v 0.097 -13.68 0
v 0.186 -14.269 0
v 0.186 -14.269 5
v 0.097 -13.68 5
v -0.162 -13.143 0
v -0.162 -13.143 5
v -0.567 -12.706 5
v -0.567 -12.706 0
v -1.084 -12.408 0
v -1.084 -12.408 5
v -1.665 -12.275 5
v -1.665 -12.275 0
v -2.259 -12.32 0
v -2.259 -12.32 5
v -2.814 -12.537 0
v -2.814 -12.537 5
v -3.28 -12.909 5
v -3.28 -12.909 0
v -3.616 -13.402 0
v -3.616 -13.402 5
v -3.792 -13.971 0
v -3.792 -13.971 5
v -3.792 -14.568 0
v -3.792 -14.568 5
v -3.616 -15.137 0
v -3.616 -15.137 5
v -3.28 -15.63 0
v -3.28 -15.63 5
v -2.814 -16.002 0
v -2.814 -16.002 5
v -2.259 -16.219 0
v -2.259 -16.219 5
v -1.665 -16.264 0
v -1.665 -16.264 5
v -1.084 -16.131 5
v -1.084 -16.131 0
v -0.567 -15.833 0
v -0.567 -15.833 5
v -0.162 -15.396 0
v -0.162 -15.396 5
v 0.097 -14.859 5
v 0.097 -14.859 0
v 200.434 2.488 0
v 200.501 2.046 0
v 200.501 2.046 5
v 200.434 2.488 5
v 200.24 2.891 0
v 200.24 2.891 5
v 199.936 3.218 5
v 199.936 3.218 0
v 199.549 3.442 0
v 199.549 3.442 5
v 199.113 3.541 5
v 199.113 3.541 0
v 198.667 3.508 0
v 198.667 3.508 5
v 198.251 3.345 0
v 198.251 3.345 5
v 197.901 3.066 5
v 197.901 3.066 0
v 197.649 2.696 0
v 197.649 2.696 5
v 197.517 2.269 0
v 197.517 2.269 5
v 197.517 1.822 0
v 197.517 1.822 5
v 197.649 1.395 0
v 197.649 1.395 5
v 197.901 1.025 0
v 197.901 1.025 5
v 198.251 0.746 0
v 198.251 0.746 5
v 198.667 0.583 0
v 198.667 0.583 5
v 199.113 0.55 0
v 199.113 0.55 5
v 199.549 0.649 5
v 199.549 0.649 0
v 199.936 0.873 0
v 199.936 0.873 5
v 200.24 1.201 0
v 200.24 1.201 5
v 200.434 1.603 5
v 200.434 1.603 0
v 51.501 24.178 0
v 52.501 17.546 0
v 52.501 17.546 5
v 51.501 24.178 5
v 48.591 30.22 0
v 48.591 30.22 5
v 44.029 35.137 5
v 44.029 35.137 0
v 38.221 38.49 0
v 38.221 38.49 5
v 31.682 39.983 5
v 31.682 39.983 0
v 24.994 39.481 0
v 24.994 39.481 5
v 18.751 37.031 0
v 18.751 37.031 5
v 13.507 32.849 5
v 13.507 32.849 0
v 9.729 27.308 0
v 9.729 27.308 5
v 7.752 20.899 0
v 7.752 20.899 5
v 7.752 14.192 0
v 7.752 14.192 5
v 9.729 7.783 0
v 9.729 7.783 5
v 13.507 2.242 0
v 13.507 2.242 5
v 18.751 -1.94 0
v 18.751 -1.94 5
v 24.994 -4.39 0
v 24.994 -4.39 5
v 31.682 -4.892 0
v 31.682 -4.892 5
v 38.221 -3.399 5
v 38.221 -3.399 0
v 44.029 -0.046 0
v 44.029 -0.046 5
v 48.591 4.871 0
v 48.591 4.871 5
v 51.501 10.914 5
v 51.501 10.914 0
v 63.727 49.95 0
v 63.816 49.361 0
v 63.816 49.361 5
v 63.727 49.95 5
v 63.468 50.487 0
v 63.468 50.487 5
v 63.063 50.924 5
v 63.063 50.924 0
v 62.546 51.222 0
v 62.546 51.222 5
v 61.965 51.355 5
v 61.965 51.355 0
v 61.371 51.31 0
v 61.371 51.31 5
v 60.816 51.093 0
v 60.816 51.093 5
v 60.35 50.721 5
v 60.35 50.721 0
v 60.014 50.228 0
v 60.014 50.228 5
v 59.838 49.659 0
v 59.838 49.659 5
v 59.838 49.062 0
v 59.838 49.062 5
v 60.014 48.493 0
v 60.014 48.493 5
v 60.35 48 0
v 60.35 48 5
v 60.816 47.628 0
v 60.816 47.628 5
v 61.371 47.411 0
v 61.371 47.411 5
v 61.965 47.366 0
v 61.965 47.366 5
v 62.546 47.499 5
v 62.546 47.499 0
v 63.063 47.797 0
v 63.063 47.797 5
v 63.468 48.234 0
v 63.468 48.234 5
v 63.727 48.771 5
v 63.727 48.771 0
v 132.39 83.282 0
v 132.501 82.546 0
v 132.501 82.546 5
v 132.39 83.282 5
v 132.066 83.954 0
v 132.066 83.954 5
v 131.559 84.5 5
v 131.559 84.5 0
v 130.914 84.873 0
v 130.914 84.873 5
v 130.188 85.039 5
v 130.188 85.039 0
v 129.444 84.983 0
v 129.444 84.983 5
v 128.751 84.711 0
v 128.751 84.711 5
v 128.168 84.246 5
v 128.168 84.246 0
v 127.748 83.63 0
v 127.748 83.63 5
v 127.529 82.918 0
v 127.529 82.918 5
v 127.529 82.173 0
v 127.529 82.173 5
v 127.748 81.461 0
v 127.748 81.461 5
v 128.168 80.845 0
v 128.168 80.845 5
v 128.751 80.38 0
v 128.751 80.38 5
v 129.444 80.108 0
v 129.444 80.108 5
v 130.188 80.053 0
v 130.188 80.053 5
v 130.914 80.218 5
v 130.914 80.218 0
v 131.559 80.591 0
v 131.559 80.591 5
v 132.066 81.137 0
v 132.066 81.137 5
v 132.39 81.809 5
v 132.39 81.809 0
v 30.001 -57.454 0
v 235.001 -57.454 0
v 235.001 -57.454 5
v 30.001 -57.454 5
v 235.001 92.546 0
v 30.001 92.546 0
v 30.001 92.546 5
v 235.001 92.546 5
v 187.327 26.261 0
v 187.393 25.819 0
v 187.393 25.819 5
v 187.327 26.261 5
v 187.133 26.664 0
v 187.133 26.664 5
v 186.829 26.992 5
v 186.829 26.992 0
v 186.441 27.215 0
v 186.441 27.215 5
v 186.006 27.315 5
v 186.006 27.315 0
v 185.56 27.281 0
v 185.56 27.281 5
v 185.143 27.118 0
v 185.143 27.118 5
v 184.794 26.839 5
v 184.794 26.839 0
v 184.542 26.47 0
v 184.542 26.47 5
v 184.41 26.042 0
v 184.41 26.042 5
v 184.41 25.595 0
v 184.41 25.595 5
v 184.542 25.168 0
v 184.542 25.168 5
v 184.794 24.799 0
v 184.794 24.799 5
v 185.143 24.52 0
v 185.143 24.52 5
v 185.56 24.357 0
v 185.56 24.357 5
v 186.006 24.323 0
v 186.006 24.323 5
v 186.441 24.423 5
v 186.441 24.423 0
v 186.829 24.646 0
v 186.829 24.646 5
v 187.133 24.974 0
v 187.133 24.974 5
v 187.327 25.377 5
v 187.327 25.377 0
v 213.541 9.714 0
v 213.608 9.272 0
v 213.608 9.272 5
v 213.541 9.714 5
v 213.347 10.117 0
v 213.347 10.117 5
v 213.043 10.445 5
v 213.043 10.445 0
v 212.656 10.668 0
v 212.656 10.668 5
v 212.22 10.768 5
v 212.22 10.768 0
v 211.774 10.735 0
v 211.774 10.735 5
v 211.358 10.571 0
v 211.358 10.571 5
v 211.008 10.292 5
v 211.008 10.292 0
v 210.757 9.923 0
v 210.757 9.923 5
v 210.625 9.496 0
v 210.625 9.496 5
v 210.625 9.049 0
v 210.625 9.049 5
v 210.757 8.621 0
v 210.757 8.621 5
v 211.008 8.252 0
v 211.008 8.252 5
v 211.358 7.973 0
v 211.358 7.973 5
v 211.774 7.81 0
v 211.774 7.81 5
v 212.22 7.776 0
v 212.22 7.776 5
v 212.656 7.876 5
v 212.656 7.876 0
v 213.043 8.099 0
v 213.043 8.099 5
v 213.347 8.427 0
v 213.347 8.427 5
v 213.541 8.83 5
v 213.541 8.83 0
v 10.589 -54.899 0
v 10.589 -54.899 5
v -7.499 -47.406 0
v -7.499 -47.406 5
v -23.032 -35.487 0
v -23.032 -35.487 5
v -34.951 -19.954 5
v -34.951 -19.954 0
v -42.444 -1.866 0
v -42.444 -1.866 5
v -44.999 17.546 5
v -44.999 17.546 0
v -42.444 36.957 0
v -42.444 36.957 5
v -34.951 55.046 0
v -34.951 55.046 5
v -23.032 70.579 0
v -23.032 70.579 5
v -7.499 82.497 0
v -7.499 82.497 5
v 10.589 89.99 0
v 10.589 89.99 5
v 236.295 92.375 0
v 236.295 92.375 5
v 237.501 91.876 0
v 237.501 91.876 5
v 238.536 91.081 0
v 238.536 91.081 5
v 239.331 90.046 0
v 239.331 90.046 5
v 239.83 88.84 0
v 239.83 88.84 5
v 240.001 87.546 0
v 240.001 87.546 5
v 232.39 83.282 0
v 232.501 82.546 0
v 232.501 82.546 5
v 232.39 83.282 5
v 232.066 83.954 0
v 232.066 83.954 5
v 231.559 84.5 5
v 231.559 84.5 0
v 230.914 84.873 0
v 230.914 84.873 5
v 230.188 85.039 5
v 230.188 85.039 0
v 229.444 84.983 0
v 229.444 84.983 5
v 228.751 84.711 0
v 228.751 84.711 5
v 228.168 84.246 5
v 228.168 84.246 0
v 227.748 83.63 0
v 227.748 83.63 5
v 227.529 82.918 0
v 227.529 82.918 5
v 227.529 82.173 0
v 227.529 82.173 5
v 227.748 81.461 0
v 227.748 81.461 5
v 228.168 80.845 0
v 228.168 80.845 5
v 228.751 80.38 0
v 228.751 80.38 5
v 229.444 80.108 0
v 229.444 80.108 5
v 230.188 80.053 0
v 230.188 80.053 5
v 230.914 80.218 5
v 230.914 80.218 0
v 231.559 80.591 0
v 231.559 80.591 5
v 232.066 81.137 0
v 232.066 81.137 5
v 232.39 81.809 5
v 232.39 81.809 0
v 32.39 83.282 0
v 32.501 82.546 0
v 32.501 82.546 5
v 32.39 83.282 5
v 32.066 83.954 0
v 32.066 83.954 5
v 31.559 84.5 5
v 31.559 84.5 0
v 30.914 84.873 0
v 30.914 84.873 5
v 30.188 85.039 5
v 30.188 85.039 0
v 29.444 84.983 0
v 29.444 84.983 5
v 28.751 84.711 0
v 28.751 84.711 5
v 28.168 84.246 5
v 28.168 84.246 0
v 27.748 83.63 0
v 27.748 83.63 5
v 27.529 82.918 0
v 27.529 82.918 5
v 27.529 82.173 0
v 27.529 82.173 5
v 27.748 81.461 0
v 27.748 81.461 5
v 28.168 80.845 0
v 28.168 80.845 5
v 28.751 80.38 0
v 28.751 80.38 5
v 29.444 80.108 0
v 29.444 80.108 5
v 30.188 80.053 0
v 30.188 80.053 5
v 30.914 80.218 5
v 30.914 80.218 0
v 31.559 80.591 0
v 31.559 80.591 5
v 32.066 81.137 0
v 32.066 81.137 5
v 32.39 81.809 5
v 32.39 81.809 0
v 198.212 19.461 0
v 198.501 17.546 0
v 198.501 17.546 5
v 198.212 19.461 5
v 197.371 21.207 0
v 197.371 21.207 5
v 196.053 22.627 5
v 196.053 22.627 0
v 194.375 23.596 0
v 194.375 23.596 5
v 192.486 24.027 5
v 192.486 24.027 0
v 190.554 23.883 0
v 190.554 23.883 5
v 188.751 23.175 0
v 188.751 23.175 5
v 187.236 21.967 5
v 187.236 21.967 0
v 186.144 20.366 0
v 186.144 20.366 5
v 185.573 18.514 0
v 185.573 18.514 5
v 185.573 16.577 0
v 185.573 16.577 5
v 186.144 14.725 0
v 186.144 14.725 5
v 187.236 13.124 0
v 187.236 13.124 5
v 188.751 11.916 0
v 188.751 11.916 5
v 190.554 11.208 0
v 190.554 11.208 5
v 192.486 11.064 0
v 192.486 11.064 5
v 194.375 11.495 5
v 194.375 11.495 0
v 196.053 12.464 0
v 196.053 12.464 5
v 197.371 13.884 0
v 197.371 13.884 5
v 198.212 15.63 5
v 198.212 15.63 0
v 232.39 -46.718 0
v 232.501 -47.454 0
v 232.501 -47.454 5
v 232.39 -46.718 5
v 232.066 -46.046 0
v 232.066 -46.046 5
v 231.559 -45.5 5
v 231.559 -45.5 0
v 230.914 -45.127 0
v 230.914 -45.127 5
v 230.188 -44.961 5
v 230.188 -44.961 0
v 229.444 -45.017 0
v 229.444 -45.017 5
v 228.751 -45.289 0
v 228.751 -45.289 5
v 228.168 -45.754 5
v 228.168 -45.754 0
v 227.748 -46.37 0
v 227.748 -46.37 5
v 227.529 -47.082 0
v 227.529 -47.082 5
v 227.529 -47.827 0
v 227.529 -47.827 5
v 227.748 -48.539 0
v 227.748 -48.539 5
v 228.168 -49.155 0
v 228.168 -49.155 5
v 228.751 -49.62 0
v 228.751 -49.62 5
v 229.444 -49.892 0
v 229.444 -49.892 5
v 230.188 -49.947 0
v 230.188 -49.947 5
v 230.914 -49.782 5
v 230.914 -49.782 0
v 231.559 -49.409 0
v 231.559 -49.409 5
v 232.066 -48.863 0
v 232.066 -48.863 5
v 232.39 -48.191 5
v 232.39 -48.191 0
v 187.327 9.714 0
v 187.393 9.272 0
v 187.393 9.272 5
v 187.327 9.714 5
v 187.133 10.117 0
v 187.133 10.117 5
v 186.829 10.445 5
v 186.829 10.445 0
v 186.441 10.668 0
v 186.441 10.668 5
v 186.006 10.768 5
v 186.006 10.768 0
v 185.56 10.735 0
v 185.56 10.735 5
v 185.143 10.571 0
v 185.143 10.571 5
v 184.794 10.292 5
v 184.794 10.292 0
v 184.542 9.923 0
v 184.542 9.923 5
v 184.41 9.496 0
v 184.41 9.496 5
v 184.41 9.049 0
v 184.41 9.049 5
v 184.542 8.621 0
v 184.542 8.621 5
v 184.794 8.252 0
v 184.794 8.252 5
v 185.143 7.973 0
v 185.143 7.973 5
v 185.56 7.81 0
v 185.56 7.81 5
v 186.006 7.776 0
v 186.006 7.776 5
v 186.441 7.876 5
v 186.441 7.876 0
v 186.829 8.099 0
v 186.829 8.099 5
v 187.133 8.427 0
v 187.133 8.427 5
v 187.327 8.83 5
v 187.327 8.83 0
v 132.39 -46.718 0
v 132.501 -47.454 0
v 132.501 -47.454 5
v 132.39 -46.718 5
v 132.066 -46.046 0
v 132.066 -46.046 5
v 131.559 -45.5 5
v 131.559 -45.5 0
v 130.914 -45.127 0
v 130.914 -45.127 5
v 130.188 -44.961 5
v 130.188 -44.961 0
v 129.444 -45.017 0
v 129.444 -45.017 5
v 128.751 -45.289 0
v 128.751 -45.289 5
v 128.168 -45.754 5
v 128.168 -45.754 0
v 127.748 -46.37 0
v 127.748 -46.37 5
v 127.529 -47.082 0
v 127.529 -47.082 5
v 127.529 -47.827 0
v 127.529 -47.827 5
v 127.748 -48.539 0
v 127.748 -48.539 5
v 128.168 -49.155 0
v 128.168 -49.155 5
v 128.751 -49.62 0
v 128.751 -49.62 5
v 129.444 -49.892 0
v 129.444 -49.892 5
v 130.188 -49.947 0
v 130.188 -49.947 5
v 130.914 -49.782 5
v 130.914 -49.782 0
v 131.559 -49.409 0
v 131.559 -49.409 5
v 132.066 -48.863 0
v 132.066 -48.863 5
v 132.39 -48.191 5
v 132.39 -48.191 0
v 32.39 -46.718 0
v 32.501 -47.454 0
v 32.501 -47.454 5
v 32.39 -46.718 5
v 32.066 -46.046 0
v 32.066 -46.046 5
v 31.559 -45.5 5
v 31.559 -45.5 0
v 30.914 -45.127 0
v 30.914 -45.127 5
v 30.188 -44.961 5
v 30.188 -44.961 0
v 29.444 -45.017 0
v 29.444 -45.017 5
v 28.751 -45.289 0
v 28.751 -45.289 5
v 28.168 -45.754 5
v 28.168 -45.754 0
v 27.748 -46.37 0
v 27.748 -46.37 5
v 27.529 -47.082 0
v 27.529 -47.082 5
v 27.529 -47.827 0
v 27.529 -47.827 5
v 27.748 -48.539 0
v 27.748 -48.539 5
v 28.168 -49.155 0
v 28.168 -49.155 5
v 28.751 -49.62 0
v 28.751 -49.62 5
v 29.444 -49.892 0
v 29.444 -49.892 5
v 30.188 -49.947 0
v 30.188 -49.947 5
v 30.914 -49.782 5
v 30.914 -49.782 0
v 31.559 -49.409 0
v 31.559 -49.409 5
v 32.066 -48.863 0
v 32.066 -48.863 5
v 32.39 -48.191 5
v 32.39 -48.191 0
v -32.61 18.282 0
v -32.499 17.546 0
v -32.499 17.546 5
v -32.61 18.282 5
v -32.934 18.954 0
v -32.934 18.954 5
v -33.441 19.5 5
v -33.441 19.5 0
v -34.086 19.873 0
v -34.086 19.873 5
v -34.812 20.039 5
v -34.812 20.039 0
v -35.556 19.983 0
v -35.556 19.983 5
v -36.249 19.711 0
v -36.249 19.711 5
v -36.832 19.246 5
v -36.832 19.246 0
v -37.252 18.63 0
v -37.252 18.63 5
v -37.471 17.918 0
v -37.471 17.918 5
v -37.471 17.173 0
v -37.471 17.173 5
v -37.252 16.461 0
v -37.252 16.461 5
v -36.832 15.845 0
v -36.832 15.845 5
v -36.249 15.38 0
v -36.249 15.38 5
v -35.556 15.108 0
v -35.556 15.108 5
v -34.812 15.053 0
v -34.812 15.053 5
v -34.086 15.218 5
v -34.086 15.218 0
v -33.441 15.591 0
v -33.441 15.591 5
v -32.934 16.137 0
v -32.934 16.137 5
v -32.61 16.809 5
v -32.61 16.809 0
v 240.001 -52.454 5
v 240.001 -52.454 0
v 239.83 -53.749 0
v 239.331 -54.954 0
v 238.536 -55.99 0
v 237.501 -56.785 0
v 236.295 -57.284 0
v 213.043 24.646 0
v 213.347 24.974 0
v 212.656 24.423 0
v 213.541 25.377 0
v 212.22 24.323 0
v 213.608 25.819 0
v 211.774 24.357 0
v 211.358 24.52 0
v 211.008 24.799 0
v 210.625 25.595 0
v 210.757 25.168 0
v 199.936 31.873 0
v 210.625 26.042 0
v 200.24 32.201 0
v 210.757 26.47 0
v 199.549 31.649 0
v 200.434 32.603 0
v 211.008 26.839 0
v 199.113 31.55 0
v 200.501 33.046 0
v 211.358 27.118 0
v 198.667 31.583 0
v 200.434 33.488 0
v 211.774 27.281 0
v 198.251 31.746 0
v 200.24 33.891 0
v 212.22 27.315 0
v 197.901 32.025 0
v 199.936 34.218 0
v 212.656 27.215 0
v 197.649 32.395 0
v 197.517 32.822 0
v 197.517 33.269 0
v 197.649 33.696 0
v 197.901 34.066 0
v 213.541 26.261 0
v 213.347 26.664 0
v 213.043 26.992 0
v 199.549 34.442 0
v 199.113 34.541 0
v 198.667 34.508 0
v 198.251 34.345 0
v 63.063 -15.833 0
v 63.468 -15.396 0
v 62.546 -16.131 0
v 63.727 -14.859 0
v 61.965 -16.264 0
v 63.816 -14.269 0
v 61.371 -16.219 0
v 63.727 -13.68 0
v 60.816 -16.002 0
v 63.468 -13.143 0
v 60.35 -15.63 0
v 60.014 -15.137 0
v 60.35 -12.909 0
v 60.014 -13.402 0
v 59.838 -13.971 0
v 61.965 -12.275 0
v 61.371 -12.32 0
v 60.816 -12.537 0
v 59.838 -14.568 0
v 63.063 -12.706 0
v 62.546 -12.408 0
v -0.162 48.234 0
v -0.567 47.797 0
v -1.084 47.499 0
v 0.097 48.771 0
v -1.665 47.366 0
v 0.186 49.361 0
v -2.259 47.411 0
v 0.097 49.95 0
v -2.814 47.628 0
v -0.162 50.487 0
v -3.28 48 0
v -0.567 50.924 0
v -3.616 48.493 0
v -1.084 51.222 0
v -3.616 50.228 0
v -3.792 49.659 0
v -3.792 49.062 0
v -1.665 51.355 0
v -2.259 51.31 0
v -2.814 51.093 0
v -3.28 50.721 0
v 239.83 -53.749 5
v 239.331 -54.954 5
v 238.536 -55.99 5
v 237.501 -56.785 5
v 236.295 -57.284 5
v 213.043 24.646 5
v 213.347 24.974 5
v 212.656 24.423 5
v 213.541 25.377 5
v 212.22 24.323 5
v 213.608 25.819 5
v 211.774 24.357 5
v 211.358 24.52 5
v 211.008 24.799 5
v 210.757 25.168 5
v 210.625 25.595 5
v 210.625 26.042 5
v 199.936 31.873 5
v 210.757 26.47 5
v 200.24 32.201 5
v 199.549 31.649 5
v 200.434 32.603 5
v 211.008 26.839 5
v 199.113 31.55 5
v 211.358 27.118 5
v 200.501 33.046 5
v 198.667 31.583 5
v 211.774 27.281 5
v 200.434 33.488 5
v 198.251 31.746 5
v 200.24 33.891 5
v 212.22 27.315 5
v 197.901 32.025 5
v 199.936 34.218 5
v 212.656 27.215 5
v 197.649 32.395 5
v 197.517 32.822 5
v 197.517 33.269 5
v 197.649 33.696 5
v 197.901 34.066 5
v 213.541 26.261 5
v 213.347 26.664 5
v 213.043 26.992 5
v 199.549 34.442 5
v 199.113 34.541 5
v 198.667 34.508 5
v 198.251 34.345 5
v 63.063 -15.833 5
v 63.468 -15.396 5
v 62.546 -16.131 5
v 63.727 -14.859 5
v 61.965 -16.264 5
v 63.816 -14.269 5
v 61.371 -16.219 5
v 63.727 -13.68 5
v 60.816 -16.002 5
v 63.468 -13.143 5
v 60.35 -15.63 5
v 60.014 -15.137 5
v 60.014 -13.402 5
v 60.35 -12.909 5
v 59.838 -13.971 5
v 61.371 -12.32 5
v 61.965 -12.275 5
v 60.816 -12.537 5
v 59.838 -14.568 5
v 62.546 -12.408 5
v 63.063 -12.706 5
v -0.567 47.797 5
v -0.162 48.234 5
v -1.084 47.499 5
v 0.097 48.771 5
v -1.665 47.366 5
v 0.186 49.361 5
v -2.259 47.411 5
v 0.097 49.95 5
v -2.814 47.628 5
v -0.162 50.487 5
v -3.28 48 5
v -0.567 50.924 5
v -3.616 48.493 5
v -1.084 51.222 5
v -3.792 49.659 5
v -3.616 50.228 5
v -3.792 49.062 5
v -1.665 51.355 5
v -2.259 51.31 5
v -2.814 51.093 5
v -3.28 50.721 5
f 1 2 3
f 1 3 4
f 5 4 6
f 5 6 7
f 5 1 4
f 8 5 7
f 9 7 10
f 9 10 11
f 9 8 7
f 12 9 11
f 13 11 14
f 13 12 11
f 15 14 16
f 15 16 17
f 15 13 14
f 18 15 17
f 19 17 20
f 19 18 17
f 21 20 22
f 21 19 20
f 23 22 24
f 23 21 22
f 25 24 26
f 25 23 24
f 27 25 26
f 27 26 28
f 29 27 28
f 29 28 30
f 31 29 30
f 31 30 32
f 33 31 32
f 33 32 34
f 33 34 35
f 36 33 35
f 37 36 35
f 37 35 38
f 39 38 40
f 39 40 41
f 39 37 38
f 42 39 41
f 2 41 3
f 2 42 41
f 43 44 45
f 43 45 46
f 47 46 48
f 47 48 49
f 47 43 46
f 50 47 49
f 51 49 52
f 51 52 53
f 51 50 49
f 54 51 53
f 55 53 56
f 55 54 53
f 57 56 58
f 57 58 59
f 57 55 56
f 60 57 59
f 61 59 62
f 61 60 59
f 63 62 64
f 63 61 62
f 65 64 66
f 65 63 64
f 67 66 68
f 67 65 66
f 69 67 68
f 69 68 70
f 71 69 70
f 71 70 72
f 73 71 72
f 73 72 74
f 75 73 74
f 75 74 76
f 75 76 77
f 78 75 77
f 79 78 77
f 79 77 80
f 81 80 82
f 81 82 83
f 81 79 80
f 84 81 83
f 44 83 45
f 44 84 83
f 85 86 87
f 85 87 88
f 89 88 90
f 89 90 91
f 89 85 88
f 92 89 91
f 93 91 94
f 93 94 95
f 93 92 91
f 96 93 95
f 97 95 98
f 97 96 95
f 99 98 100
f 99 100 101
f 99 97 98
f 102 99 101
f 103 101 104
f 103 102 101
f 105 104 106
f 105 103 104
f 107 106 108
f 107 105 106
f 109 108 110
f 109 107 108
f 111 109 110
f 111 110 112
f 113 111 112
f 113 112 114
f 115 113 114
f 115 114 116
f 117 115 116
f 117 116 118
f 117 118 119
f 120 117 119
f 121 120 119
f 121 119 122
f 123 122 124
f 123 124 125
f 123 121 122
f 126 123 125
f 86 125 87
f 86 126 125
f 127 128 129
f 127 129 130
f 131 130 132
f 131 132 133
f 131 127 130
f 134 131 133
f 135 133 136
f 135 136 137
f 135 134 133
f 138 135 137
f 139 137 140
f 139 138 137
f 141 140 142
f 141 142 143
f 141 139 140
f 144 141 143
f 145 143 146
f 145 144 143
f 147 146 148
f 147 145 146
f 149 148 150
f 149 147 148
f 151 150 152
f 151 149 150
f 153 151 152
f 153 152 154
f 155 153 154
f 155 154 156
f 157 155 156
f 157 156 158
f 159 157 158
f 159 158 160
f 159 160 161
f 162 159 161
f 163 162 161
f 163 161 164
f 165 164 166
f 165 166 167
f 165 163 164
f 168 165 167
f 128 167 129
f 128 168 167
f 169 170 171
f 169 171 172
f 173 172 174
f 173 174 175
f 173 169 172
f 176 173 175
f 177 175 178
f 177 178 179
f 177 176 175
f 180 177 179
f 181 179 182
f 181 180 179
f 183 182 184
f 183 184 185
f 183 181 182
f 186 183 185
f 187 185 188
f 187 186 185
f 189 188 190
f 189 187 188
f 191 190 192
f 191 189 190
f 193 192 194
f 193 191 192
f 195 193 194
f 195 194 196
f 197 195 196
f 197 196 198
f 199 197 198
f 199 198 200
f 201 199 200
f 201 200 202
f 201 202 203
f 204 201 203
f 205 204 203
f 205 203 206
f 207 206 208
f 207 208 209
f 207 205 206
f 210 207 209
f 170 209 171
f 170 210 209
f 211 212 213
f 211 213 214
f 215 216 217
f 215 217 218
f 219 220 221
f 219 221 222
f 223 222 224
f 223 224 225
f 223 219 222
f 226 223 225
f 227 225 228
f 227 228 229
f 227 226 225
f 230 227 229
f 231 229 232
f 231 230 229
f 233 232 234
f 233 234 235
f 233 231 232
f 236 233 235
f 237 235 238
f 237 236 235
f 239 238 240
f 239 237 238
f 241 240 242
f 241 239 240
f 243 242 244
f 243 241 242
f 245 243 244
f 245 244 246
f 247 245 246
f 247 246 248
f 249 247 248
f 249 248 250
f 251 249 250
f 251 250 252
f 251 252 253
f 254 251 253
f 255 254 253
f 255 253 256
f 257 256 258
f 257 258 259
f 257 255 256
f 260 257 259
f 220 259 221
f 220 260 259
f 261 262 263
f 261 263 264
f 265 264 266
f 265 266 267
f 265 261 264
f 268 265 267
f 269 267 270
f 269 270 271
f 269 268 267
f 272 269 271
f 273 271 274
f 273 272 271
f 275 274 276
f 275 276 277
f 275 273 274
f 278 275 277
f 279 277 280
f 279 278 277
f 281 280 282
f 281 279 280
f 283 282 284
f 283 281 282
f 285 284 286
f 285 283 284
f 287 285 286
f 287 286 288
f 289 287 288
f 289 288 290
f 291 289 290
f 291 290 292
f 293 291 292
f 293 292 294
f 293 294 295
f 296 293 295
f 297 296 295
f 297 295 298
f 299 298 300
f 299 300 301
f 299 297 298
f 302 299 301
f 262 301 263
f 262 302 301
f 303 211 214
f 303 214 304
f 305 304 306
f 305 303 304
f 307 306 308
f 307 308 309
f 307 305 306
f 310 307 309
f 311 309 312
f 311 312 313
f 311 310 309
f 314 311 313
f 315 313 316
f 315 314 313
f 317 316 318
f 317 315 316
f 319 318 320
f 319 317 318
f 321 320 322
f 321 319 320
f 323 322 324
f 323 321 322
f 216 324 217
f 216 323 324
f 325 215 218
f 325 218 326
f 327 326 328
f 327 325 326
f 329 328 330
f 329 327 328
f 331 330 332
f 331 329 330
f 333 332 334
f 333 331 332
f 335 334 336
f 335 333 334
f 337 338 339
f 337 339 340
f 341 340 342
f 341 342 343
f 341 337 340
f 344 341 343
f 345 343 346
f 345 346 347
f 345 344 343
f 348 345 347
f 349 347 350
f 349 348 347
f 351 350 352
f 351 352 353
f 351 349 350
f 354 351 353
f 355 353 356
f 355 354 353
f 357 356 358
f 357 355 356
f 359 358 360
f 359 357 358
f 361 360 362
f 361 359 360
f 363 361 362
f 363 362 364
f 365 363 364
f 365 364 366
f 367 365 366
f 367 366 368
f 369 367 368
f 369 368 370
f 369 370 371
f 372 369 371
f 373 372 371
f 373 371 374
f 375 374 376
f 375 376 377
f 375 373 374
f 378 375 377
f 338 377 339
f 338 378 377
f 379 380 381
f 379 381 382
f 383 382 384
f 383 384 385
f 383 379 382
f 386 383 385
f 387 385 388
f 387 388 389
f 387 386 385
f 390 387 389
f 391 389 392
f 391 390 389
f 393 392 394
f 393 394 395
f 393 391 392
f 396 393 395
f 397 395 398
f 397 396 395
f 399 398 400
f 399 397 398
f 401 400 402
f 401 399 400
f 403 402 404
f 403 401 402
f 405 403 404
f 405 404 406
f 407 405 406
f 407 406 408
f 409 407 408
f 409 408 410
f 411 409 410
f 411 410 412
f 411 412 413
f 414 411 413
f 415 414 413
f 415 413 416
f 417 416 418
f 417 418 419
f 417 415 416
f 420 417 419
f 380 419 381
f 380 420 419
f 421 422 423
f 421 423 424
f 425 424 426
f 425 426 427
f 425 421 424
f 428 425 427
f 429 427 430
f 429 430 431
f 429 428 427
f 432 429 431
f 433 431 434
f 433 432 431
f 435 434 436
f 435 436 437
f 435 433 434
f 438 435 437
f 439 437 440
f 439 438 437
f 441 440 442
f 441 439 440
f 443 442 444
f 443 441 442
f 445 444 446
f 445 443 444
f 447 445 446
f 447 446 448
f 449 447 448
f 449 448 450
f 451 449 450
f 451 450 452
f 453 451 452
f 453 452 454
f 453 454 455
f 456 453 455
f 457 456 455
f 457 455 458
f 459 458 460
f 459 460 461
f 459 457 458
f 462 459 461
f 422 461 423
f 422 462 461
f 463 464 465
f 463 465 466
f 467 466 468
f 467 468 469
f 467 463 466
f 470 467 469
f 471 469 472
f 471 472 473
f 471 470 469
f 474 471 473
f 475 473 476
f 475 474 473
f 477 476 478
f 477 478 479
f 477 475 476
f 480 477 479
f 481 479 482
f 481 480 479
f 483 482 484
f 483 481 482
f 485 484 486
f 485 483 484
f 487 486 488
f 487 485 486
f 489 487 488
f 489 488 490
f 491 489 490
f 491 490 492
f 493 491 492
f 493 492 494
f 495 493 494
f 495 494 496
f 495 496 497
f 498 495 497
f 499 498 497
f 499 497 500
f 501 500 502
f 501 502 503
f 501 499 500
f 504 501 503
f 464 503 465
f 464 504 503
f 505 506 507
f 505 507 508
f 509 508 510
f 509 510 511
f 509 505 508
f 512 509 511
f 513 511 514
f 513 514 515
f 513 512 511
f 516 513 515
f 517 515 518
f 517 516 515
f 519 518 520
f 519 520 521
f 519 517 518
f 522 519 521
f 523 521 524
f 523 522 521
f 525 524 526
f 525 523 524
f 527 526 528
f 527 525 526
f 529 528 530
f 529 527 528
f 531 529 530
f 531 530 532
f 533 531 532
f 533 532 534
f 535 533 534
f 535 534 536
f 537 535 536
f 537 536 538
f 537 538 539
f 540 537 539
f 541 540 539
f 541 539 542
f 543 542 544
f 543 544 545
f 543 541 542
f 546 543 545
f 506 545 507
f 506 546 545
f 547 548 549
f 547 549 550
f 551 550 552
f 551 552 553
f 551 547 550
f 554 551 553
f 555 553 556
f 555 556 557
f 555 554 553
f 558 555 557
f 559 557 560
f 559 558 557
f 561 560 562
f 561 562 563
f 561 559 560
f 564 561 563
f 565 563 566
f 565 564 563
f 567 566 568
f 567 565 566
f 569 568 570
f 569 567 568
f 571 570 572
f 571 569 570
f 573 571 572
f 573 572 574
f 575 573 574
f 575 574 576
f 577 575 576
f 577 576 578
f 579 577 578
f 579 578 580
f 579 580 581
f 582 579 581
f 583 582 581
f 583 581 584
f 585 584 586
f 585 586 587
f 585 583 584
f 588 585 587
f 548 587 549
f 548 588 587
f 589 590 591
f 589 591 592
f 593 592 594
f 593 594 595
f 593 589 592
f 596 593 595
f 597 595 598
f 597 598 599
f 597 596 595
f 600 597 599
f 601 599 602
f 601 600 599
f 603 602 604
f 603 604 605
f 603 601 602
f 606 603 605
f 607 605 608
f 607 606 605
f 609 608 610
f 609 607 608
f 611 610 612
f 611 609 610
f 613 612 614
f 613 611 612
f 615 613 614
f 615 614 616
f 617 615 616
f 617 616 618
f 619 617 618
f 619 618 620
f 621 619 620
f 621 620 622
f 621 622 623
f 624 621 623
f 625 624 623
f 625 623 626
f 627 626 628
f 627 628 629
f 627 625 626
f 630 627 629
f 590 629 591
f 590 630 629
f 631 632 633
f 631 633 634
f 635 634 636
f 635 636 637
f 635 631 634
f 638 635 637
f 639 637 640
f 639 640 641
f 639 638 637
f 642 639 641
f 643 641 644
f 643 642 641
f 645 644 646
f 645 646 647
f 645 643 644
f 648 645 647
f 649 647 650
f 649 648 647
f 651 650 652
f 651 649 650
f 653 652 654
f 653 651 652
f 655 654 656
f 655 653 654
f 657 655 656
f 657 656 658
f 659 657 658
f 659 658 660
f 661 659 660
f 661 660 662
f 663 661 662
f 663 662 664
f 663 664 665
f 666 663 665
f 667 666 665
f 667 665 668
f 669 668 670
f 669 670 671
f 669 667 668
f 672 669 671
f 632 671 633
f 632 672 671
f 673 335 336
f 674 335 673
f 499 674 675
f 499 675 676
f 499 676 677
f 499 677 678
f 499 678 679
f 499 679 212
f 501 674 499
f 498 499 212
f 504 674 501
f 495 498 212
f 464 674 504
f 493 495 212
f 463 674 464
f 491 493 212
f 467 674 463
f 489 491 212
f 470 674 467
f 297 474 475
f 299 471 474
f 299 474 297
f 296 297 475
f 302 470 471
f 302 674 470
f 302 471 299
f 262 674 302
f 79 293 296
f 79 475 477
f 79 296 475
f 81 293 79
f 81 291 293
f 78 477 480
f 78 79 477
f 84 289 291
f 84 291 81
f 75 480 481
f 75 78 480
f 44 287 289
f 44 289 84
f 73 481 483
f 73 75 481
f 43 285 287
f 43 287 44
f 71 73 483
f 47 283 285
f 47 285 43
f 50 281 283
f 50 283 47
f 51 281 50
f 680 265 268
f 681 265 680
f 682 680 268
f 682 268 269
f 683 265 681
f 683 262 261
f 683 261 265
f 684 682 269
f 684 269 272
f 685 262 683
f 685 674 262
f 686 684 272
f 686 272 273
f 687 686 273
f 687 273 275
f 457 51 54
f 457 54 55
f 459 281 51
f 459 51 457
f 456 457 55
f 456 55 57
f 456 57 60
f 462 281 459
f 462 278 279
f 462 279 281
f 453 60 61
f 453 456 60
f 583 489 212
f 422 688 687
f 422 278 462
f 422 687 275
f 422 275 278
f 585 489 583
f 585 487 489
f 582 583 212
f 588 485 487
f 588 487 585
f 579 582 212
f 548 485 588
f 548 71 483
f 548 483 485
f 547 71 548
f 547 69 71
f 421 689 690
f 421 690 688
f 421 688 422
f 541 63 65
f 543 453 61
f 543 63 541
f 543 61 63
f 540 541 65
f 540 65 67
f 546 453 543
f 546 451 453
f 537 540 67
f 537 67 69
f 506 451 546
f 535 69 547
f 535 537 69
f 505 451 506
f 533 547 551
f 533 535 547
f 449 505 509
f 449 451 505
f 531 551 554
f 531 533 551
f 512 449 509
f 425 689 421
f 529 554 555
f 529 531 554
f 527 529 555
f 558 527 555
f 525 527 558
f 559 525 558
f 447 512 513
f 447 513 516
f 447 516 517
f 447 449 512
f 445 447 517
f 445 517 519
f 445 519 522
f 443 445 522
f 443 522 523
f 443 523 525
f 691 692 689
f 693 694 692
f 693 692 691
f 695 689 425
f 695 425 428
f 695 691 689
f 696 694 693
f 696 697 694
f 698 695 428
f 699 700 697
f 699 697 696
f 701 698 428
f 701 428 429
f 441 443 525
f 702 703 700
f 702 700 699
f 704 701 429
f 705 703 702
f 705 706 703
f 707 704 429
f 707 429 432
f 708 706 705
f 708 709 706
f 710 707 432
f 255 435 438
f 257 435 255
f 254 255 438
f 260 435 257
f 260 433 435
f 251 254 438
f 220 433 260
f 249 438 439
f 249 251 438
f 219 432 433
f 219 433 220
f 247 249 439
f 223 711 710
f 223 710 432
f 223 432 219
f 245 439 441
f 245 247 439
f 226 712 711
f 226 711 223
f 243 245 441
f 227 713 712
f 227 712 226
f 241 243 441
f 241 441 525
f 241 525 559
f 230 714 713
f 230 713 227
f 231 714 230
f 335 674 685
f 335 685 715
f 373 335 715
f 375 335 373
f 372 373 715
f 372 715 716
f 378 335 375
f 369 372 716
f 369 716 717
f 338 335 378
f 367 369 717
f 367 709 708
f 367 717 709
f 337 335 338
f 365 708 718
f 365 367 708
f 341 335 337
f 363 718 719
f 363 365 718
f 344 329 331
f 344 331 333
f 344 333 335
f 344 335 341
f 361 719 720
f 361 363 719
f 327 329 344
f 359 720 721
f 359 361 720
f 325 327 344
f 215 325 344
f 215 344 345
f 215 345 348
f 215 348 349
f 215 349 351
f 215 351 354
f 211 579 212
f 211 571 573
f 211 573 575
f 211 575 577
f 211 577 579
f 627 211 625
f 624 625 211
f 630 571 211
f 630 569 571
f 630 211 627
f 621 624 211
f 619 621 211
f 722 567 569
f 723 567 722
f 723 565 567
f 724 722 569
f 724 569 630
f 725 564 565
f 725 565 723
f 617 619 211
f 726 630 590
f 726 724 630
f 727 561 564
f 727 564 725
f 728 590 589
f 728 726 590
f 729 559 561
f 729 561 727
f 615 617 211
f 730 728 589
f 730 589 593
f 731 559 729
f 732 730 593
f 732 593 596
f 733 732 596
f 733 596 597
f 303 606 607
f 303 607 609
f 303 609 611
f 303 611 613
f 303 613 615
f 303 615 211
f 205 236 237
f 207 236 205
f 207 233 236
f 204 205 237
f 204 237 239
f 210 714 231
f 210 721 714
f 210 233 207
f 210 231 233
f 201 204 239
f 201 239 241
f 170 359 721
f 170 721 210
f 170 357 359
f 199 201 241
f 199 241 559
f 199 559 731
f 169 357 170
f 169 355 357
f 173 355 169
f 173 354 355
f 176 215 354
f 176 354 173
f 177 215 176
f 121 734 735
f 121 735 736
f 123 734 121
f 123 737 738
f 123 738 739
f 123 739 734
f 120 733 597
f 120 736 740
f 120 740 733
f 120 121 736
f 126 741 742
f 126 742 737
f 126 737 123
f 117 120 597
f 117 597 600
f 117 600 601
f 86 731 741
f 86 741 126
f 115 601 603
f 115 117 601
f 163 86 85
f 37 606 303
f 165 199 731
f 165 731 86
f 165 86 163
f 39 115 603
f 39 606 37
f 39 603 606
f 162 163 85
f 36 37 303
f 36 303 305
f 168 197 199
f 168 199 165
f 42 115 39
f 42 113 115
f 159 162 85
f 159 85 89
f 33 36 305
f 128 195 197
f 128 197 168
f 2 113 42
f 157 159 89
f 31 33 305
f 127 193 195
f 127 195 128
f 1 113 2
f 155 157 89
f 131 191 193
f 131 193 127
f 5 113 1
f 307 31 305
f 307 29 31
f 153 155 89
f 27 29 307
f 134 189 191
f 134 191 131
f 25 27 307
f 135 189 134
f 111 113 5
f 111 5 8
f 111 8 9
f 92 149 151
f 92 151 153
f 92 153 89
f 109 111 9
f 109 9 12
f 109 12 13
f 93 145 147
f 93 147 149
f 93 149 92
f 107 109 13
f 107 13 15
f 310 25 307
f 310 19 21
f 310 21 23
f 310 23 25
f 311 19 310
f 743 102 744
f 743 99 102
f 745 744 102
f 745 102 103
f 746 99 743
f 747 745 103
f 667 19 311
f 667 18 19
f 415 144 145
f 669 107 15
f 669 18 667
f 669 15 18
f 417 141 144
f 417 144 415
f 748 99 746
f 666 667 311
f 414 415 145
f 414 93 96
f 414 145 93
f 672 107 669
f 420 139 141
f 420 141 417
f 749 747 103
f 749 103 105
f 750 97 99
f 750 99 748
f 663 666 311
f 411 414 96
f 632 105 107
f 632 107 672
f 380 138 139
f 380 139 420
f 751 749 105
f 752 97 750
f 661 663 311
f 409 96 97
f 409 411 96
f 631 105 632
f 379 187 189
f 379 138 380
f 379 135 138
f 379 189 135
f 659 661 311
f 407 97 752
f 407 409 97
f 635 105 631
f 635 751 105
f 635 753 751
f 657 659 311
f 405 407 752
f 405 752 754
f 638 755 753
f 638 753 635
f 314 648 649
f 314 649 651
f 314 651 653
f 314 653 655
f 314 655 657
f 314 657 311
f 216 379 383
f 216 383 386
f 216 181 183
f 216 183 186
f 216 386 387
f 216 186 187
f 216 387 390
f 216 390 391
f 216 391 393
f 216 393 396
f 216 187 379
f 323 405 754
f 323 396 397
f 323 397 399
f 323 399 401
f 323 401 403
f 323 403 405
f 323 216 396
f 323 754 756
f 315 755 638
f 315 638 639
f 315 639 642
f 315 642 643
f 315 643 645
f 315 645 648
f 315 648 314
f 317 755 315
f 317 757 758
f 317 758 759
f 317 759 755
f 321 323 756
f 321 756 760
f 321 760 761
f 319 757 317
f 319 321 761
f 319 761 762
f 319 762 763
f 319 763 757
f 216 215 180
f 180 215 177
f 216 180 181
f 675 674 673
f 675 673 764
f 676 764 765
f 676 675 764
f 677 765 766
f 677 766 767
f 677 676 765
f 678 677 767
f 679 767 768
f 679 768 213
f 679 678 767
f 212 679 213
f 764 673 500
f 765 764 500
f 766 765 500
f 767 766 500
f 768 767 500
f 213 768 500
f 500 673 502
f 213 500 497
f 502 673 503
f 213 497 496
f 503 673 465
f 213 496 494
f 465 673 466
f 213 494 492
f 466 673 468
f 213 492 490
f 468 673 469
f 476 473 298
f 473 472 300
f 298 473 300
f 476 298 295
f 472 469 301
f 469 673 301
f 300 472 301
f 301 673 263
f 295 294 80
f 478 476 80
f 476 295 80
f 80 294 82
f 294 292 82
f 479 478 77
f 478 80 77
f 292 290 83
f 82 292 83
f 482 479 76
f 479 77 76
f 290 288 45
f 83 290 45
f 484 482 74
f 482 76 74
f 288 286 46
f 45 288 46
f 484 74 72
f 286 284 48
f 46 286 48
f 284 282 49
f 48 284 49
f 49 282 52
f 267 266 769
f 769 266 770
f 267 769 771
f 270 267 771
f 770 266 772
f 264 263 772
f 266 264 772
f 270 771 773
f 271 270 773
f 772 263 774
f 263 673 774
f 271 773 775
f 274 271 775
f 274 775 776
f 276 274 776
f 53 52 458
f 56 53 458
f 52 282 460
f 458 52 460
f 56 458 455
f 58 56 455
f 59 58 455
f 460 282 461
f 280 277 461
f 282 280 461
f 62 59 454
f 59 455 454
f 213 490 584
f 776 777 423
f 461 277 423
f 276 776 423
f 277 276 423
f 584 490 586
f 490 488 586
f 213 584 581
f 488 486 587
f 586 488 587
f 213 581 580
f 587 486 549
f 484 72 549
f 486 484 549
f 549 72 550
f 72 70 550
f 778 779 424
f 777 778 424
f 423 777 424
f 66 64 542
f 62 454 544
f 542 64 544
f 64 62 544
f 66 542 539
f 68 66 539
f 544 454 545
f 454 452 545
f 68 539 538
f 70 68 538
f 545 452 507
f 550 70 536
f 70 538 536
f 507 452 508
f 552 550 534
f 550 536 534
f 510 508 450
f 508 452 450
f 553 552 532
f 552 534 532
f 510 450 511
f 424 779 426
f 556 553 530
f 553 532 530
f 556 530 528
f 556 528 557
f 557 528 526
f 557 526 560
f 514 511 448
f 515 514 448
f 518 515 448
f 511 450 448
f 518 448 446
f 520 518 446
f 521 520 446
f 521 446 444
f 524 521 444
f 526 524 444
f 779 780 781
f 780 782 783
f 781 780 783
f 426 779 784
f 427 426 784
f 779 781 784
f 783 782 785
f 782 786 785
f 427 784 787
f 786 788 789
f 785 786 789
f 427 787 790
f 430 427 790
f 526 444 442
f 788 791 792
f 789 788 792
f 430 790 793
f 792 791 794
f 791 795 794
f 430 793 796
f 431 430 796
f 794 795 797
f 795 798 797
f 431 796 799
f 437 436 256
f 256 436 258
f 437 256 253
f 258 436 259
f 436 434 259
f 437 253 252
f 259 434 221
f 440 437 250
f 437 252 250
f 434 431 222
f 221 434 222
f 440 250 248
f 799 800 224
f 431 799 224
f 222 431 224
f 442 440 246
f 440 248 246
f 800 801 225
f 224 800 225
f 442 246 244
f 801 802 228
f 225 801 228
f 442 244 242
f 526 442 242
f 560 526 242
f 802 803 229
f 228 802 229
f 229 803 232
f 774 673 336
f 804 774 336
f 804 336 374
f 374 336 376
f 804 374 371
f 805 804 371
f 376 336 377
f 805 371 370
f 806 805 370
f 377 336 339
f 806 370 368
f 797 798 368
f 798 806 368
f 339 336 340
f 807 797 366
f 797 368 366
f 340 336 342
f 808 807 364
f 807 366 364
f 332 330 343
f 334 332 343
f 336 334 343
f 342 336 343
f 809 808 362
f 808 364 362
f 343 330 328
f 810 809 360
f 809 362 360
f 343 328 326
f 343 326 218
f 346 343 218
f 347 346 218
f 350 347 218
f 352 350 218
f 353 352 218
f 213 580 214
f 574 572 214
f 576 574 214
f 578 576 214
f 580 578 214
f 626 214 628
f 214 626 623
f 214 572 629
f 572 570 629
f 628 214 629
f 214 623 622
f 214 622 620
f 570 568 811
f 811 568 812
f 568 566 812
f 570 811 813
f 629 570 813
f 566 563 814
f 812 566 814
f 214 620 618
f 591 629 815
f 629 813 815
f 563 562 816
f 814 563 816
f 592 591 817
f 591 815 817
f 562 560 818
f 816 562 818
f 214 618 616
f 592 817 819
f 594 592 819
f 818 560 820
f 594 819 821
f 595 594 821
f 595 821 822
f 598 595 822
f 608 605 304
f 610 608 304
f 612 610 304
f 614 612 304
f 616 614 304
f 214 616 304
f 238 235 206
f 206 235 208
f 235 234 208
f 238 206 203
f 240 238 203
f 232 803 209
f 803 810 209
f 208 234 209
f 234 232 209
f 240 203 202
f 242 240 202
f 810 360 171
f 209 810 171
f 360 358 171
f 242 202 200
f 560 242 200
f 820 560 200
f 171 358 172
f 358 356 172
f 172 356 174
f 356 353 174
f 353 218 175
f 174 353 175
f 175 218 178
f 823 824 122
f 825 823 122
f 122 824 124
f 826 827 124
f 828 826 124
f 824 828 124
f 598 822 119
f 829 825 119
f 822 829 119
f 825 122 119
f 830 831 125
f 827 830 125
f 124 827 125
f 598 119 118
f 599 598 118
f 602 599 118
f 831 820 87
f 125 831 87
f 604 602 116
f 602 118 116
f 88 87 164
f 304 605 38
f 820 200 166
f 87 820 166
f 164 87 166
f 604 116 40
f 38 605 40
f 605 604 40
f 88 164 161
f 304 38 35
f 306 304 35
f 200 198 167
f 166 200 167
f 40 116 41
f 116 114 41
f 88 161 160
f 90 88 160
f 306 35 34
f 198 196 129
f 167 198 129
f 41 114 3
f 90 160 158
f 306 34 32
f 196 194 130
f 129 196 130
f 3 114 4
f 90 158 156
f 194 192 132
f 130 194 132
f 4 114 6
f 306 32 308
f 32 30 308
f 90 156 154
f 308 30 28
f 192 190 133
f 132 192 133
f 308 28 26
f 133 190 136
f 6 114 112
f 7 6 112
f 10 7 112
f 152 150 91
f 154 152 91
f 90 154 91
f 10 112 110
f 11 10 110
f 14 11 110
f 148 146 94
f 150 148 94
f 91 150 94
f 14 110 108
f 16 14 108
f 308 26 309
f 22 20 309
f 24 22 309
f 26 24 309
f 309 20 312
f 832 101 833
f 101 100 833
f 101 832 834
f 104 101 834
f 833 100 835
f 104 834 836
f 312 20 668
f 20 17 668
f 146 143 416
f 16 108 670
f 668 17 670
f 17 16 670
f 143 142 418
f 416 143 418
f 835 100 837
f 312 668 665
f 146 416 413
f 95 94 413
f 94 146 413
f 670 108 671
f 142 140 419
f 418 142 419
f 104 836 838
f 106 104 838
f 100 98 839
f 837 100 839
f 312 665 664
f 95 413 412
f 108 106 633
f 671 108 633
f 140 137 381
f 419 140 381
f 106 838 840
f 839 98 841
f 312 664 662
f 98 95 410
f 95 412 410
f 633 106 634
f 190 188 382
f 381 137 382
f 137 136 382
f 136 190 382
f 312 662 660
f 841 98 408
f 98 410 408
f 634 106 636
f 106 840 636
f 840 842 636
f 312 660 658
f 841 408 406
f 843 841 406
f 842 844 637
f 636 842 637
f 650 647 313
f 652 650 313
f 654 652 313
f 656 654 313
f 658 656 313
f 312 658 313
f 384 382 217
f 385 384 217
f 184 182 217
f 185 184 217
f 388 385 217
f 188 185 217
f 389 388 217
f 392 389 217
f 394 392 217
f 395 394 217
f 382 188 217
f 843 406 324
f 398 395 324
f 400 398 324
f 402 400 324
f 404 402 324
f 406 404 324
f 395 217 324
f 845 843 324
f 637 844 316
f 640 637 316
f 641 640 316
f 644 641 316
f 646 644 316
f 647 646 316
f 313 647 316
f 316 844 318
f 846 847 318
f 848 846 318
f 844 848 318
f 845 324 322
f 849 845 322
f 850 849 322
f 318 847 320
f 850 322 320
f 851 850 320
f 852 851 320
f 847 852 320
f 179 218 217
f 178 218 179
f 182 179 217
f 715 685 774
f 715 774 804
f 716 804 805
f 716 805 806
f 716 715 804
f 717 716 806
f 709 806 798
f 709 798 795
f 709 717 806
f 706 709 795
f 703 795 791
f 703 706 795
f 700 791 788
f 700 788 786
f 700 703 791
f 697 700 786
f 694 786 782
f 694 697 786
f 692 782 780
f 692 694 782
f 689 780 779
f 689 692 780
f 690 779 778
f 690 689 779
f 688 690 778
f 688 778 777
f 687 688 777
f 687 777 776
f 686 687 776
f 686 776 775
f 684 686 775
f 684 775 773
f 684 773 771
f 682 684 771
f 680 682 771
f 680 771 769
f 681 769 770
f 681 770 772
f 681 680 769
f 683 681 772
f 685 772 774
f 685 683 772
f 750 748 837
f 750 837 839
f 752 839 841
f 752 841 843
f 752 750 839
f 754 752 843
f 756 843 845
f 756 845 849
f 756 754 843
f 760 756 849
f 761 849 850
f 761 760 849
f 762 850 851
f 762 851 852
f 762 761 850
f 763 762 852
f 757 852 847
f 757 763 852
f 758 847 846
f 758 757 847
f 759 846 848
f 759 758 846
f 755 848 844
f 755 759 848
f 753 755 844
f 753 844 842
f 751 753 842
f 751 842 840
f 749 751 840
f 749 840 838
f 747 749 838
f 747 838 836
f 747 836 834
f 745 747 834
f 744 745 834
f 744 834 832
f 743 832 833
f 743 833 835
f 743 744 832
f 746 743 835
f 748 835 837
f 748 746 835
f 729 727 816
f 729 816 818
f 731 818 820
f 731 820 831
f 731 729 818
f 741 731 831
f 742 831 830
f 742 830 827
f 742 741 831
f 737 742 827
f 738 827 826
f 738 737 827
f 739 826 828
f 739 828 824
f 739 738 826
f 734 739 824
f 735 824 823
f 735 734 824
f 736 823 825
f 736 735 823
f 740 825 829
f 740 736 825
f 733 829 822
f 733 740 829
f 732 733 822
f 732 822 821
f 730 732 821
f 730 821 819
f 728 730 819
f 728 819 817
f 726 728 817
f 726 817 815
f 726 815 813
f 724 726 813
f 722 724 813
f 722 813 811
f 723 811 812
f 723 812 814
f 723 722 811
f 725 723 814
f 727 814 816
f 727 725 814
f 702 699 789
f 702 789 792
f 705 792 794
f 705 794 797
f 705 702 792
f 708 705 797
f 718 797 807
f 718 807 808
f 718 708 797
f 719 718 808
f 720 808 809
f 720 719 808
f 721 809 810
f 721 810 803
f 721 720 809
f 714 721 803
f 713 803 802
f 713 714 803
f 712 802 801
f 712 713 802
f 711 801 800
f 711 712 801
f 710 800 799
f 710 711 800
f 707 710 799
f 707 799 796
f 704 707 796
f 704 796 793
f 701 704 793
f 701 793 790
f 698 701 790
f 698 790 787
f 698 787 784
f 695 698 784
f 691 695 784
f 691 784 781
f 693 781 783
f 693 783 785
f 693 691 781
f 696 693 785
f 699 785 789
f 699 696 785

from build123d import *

# Parameters (mm, degrees)
SKETCH1_R           = 2.5
SKETCH1_R_2         = 22.5
SKETCH1_R_3         = 2
SKETCH1_R_4         = 6.5
SKETCH1_R_5         = 1.5
BOSS_EXTRUDE1_DEPTH = 5


with BuildPart() as part:
    # Sketch1 → Boss-Extrude1 (new body)
    with BuildSketch(Plane.XY):
        with BuildLine():
            Line((30.000692042, 92.545526446), (235.000692042, 92.545526446))
            ThreePointArc((235.000692042, 92.545526446), (238.536225947, 91.081060352), (240.000692042, 87.545526446))
            Line((240.000692042, 87.545526446), (240.000692042, -52.454473554))
            ThreePointArc((240.000692042, -52.454473554), (238.536225947, -55.99000746), (235.000692042, -57.454473554))
            Line((235.000692042, -57.454473554), (30.000692042, -57.454473554))
            ThreePointArc((30.000692042, -57.454473554), (-44.999307958, 17.545526446), (30.000692042, 92.545526446))
        make_face()
        with Locations((-34.999307958, 17.545526446)):
            Circle(SKETCH1_R, mode=Mode.SUBTRACT)
        with Locations((30.000692042, -47.454473554)):
            Circle(SKETCH1_R, mode=Mode.SUBTRACT)
        with Locations((30.000692042, 82.545526446)):
            Circle(SKETCH1_R, mode=Mode.SUBTRACT)
        with Locations((230.000692042, -47.454473554)):
            Circle(SKETCH1_R, mode=Mode.SUBTRACT)
        with Locations((230.000692042, 82.545526446)):
            Circle(SKETCH1_R, mode=Mode.SUBTRACT)
        with Locations((130.000692042, 82.545526446)):
            Circle(SKETCH1_R, mode=Mode.SUBTRACT)
        with Locations((130.000692042, -47.454473554)):
            Circle(SKETCH1_R, mode=Mode.SUBTRACT)
        with Locations((30.000692042, 17.545526446)):
            Circle(SKETCH1_R_2, mode=Mode.SUBTRACT)
        with Locations((61.815692042, 49.360526446)):
            Circle(SKETCH1_R_3, mode=Mode.SUBTRACT)
        with Locations((61.815692042, -14.269473554)):
            Circle(SKETCH1_R_3, mode=Mode.SUBTRACT)
        with Locations((-1.814307958, -14.269473554)):
            Circle(SKETCH1_R_3, mode=Mode.SUBTRACT)
        with Locations((-1.814307958, 49.360526446)):
            Circle(SKETCH1_R_3, mode=Mode.SUBTRACT)
        with Locations((192.000692042, 17.545526446)):
            Circle(SKETCH1_R_4, mode=Mode.SUBTRACT)
        with Locations((199.000692042, 33.045526446)):
            Circle(SKETCH1_R_5, mode=Mode.SUBTRACT)
        with Locations((199.000692042, 2.045526446)):
            Circle(SKETCH1_R_5, mode=Mode.SUBTRACT)
        with Locations((185.893407347, 25.818922843)):
            Circle(SKETCH1_R_5, mode=Mode.SUBTRACT)
        with Locations((212.107976736, 25.818922843)):
            Circle(SKETCH1_R_5, mode=Mode.SUBTRACT)
        with Locations((212.107976736, 9.272130049)):
            Circle(SKETCH1_R_5, mode=Mode.SUBTRACT)
        with Locations((185.893407347, 9.272130049)):
            Circle(SKETCH1_R_5, mode=Mode.SUBTRACT)
    extrude(amount=BOSS_EXTRUDE1_DEPTH)


solid = part.part
